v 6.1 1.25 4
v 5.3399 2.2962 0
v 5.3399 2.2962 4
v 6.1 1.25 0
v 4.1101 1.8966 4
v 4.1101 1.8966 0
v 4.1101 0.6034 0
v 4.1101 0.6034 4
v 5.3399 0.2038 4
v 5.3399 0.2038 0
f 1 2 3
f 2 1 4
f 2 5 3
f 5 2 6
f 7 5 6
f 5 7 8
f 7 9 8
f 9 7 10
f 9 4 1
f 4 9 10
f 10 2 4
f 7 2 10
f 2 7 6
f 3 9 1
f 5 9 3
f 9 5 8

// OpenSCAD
union() {
  translate([5.0, 1.25, 0.0]) cylinder(r=1.1, h=4.0);
}
